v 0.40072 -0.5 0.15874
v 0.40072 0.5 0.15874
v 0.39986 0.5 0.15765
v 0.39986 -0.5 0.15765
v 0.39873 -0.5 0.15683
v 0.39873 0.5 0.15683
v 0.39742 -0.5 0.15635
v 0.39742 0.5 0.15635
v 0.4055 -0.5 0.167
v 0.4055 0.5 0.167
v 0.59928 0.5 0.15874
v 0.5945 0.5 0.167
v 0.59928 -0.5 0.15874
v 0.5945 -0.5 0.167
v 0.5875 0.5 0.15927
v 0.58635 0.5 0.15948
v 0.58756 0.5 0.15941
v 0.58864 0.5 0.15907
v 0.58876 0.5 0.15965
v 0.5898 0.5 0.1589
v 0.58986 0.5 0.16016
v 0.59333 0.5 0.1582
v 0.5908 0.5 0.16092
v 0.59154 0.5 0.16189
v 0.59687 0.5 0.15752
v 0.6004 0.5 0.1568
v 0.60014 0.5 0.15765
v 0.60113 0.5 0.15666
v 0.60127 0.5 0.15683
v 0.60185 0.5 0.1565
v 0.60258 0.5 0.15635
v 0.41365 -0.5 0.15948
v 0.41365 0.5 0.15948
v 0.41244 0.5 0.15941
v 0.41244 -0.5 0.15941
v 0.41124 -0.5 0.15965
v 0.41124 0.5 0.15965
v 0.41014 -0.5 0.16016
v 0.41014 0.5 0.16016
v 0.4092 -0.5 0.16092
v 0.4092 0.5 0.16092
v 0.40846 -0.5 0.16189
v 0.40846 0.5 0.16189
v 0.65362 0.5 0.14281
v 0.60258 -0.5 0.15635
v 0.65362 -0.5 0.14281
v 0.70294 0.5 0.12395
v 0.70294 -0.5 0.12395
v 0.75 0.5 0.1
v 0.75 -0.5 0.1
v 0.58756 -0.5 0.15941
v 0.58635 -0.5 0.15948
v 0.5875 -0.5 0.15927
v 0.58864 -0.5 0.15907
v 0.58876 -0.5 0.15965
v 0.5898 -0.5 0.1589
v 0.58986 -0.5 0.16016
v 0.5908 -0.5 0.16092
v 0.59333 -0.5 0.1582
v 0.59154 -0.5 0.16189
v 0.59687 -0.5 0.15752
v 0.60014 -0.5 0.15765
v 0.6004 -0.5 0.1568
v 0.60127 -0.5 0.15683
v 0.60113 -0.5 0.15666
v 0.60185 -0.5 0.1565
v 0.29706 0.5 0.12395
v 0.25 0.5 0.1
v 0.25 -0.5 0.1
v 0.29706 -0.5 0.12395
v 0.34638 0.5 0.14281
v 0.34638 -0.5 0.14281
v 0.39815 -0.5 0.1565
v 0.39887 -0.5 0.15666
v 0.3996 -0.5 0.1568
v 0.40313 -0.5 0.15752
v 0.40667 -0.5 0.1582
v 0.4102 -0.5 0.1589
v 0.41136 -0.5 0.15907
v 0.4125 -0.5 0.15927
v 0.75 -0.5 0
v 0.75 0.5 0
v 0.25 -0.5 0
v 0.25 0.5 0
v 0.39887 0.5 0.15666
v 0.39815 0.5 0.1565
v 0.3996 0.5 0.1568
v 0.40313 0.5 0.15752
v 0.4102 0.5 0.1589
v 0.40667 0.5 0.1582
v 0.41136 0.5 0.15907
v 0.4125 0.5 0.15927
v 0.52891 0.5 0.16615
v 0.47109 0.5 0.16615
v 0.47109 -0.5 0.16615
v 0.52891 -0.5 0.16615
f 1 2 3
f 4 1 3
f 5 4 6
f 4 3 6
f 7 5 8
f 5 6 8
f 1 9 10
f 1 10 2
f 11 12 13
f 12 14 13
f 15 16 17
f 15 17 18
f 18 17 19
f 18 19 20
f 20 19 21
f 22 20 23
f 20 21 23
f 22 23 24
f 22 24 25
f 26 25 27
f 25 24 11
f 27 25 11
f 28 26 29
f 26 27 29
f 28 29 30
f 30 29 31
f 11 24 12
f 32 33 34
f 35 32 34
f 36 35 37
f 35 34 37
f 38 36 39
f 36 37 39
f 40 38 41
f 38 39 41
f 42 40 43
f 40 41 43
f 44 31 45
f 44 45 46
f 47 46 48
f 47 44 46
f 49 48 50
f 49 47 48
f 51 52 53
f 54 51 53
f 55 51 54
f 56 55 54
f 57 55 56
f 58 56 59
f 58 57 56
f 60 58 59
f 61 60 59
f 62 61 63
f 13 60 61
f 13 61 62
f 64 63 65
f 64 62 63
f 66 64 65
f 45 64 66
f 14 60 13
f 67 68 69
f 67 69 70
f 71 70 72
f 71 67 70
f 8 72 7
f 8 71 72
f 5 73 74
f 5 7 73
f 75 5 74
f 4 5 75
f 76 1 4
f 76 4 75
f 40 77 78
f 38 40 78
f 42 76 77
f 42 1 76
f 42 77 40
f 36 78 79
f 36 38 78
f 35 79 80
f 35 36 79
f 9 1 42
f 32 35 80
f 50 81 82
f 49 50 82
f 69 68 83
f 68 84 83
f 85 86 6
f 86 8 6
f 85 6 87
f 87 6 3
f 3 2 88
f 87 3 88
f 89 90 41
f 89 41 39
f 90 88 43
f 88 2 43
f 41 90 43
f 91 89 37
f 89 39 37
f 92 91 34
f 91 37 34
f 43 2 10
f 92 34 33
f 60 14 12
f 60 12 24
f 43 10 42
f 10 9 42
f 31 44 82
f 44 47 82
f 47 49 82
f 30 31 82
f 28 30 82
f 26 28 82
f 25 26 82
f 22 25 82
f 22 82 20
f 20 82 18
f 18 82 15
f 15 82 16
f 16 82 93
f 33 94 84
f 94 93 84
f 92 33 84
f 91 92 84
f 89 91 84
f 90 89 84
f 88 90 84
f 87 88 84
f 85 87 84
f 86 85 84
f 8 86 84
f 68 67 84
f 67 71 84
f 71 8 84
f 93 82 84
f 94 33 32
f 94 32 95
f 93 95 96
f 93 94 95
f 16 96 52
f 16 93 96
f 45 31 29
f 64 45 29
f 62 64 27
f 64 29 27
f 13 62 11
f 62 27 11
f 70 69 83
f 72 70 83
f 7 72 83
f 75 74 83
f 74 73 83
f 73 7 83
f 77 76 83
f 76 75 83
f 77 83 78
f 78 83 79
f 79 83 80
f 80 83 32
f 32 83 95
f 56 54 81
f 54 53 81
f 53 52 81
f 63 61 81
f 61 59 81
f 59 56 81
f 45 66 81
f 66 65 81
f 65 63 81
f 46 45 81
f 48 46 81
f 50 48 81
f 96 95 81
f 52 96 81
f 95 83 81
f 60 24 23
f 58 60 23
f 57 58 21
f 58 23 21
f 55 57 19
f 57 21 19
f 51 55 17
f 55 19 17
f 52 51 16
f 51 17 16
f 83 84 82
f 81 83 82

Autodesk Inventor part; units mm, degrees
ref_plane "YZ Plane" through (0, 0, 0) normal (1, 0, 0) x (0, 1, 0)
ref_plane "XZ Plane" through (0, 0, 0) normal (0, 1, 0) x (-1, 0, 0)
ref_plane "XY Plane" through (0, 0, 0) normal (0, 0, 1) x (1, 0, 0)
sketch "스케치1" plane through (0, 0, 0) normal (0, 0, 1) x (1, 0, 0)
  line L0 (-0.15, 0) -> (0.9, 0) construction
  line L1 (0, -0.7) -> (0, 0.7) construction
  line L2 (0.25, -0.5) -> (0.75, -0.5)
  line L3 (0.75, -0.5) -> (0.75, 0.5)
  line L4 (0.75, 0.5) -> (0.25, 0.5)
  line L5 (0.25, 0.5) -> (0.25, -0.5)
  point P0 (0, 0)
  point P1 (0.5, -0.5)
  dimension "d7" = 0.5
  dimension "d8" = 1
  dimension "d9" = 0.25
extrude "돌출1" add sketch "스케치1" along normal blind 0.1
sketch "스케치3" plane through (0.25, 0.5, 0) normal (0, 1, 0) x (1, 0, 0)
  line L0 (-0.25, 0.6093) -> (-0.25, -0.2964) construction
  line L1 (-0.4, 0) -> (0.65, 0) construction
  line L2 (0.5, 0) -> (0, 0) projected
  line L3 (0, 0) -> (0, -0.1) projected
  line L4 (0.5, -0.1) -> (0, -0.1) projected
  line L5 (0.5, 0) -> (0.5, -0.1) projected
  arc A0 (0, -0.1) -> (0.5, -0.1) centre (0.25, 0.333) ccw
  line L6 (0.25, -0.1) -> (0.25, 0.4799) construction
  point P0 (-0.25, 0)
  dimension "d10" = 0.5
extrude "돌출2" add sketch "스케치3" against normal up to surface (1 mm away) contours A0 L4
sketch "스케치4" plane through (0.25, -0.5, 0) normal (0, -1, 0) x (1, 0, 0)
  line L0 (0, 0) -> (0.5, 0) projected
  line L1 (0.5, 0) -> (0.5, 0.1) projected
  arc A0 (0.5, 0.1) -> (0, 0.1) centre (0.25, -0.333) ccw projected
  line L2 (0, 0) -> (0, 0.1) projected
  line L3 (0, 0) -> (0.5, 0) construction
  line L4 (0.25, 0) -> (0.25, 0.167) construction
  line L5 (0.25, 0) -> (0.5, 0.1) construction
  line L6 (0.2748, 0.1714) -> (0.4348, 0.1406) construction
  line L7 (0.25, 0) -> (0.3445, 0.158) construction
  arc A1 (0.5, 0.1) -> (0, 0.1) centre (0.25, -0.333) ccw construction
  line L8 (0.3445, 0.158) -> (0.3445, 0) construction
  line L9 (0.3445, 0.158) -> (0.3445, 0.167) construction
  line L10 (0.3445, 0.167) -> (0.3398, 0.1589)
  line L11 (0.3445, 0.167) -> (0.3504, 0.1568)
  line L12 (0.1555, 0.167) -> (0.1602, 0.1589)
  line L13 (0.1555, 0.167) -> (0.1496, 0.1568)
  point P0 (-0.25, 0)
  dimension "d13" = 21.801
  dimension "d18" = 0.167
  dimension "d21" = 70
  dimension "d22" = 30
  dimension "d23" = 30
  dimension "d24" = 0.167
extrude "돌출4" add sketch "스케치4" against normal up to surface (1 mm away) contours L13 L12 A0 | A0 L10 L11
fillet "모깎기1" radius 0.005 4 edges at (0.3996, 0, 0.1568) (0.4102, 0, 0.1589) (0.6004, 0, 0.1568) (0.5898, 0, 0.1589)
properties part number "flat_surface_1"
